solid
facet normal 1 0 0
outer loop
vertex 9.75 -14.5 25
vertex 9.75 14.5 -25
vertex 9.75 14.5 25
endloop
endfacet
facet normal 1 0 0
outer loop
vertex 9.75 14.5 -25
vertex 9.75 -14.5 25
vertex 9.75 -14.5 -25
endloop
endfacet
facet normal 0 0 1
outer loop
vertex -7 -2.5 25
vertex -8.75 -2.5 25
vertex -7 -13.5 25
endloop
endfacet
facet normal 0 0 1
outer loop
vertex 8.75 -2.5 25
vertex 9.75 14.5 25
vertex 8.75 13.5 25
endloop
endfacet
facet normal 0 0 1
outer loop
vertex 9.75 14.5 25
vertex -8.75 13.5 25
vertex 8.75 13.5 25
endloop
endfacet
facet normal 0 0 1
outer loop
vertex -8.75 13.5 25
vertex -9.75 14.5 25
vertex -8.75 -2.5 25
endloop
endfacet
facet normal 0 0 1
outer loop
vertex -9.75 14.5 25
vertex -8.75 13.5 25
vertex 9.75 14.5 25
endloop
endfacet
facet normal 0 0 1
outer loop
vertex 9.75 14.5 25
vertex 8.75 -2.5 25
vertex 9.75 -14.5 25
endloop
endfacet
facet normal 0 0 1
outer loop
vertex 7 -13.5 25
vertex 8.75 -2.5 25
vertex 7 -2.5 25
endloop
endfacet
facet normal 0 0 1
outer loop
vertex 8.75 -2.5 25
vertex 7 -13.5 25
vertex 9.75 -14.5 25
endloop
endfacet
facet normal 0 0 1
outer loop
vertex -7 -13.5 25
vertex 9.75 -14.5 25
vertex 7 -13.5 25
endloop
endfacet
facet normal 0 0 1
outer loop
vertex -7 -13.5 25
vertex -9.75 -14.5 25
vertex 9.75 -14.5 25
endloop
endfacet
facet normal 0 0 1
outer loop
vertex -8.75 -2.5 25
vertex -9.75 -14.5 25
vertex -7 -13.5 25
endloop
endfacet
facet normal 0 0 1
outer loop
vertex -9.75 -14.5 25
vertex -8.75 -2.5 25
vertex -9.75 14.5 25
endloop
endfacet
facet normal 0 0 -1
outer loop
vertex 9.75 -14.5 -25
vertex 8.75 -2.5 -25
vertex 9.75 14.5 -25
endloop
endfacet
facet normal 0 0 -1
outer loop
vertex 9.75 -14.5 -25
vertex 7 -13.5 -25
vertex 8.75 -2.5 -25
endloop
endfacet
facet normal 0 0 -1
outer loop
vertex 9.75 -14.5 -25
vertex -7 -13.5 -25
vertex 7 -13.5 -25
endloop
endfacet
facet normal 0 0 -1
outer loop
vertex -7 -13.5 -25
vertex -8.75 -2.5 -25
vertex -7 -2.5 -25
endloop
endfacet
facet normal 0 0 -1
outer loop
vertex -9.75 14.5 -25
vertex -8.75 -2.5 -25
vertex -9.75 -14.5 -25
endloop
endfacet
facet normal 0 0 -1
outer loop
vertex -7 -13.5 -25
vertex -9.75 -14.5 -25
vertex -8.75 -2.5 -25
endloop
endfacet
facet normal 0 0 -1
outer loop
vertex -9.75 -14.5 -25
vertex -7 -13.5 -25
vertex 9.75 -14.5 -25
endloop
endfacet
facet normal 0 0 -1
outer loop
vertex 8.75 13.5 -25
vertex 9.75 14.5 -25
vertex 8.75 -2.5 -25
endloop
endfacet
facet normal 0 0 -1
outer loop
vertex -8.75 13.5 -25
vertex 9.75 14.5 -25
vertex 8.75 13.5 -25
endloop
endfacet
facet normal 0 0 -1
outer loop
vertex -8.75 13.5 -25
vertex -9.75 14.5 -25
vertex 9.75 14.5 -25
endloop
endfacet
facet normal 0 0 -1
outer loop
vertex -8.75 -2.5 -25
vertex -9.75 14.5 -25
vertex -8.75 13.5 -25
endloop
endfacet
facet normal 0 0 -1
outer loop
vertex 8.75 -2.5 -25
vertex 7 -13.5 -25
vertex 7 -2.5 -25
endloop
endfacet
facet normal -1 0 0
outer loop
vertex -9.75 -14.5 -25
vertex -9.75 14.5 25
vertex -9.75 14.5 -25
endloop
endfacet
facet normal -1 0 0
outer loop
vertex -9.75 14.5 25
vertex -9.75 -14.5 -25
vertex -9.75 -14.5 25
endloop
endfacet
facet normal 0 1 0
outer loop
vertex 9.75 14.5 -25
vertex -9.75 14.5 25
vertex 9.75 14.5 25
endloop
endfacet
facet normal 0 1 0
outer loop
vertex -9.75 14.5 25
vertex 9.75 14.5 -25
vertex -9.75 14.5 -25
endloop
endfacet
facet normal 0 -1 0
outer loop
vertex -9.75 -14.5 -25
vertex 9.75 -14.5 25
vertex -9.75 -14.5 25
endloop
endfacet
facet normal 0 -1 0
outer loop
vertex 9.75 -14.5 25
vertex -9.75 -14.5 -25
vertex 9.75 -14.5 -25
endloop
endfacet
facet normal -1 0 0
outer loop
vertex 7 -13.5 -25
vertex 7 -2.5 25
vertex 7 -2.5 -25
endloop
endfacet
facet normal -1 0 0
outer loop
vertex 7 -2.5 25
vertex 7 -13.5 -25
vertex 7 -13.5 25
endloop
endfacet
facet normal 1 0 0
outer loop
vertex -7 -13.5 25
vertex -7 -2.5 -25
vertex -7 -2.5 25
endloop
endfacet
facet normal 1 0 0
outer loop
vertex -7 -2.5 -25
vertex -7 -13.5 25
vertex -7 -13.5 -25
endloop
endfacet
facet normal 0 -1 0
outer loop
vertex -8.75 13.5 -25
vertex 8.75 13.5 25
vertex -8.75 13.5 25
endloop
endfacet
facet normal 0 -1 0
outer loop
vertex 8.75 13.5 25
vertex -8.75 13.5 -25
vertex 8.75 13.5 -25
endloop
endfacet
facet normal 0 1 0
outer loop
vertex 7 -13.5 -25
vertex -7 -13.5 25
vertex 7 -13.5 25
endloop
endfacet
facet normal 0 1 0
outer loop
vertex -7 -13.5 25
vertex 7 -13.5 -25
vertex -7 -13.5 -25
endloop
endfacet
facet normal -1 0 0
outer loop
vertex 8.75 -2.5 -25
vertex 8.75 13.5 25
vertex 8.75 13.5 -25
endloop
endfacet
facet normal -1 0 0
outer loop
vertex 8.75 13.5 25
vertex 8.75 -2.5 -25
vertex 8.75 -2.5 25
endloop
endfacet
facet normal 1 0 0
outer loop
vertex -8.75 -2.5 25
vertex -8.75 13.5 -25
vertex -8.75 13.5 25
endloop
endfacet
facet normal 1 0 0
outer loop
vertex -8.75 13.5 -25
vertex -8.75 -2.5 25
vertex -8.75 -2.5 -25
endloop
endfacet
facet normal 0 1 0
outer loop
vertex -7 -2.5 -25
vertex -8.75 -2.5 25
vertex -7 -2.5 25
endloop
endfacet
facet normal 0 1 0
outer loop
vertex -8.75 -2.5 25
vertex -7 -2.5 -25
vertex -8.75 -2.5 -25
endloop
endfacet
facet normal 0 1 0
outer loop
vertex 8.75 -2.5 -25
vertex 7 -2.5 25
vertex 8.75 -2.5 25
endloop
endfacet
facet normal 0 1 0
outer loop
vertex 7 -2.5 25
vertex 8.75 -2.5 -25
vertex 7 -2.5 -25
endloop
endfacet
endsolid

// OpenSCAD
height = 50;

difference() {
    cube([19.5, 29, height], center=true);
    #cube([14, 27, height+1], center=true);
    translate([0, 5.5, 0]) #cube([17.5, 16, height+1], center=true);
}
